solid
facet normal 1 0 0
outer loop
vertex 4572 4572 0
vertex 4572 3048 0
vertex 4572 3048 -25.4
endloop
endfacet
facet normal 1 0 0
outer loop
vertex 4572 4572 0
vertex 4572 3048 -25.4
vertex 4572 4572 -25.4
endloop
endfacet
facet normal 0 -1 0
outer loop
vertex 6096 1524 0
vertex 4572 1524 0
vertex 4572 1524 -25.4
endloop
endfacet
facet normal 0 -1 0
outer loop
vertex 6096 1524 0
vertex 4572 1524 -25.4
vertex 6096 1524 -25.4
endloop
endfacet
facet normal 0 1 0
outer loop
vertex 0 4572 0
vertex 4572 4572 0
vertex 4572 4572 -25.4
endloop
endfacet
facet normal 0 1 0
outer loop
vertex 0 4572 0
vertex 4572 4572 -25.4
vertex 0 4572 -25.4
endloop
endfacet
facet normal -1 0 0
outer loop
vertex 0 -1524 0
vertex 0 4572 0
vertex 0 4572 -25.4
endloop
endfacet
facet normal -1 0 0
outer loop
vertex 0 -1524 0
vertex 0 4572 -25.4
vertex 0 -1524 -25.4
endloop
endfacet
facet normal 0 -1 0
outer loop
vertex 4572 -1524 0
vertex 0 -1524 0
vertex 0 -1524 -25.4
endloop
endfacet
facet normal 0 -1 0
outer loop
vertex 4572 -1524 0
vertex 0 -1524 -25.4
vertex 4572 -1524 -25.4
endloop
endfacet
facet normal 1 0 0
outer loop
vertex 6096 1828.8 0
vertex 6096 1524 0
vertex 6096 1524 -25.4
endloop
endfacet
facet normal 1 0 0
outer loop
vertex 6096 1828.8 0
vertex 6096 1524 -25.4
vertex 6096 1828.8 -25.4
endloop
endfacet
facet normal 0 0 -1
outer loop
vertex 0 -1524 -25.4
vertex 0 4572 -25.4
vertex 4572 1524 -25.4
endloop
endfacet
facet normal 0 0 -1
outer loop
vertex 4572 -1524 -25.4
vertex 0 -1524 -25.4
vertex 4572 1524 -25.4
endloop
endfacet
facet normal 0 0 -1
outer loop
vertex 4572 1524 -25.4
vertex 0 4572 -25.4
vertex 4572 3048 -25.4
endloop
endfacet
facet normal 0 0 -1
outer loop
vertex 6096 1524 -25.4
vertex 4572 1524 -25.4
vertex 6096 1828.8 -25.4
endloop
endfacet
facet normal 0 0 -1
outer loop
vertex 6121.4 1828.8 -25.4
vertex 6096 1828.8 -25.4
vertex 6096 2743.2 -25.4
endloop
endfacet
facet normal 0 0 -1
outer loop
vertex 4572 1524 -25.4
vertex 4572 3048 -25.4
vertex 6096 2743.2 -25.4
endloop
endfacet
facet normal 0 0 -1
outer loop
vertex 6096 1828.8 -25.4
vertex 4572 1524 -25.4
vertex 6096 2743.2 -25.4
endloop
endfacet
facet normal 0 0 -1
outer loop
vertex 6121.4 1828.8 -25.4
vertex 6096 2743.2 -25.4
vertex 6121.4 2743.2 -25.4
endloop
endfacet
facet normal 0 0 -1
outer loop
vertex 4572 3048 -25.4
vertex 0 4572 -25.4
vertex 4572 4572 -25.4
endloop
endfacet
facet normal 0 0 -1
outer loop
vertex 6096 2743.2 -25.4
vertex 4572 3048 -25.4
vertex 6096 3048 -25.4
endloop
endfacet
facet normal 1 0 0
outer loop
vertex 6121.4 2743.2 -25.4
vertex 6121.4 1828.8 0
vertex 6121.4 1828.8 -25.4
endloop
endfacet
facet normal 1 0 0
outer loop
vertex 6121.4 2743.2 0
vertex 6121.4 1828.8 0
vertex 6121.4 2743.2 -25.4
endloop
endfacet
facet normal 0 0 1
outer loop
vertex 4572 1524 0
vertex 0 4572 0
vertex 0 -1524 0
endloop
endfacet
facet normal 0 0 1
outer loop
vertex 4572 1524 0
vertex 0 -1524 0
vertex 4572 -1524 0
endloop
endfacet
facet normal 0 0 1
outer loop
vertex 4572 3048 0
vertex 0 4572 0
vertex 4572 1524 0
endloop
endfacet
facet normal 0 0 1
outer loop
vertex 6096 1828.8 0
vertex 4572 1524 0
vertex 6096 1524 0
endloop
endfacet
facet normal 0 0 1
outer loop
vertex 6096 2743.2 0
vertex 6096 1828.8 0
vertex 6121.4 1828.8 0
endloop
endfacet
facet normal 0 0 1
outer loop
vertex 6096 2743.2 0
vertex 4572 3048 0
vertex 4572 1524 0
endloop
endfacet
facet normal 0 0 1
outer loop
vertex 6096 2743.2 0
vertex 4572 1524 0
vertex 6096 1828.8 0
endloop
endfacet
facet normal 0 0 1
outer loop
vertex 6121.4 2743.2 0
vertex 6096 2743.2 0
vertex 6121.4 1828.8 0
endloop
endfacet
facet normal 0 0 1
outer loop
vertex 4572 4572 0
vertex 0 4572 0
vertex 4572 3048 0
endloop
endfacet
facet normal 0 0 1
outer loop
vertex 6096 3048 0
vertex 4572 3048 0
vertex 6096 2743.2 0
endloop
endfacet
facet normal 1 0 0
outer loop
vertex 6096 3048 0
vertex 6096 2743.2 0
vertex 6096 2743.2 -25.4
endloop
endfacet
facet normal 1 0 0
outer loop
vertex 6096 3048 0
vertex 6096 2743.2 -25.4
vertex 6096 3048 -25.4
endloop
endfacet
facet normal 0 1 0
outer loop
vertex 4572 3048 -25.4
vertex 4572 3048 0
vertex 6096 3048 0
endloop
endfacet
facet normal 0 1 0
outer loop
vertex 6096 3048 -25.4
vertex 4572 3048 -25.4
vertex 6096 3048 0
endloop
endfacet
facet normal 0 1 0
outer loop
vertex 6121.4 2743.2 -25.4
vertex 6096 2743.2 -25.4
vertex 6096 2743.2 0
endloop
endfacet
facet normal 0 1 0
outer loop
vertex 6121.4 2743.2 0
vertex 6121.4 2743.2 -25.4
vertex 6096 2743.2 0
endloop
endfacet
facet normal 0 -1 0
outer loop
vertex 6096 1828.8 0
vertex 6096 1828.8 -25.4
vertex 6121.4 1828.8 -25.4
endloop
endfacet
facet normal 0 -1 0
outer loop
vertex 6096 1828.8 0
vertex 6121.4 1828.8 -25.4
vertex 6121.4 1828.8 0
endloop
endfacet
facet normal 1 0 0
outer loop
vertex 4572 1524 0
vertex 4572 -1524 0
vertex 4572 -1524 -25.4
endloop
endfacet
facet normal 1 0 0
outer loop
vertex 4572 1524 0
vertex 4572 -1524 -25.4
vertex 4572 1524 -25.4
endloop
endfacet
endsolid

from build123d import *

# Parameters (mm, degrees)
F0_W     = 1524
F0_H     = 1524
F1_DEPTH = 25.4
F2_W     = 914.4
F2_H     = 25.4
F3_DEPTH = 25.4


with BuildPart() as f1:
    # F0 (on Top) → F1 (new body)
    with BuildSketch(Plane.XY):
        with Locations((5334, 2286)):
            Rectangle(F0_W, F0_H)
        with Locations((762, -762)):
            Rectangle(F0_W, F0_H)
        with Locations((762, 3810)):
            Rectangle(F0_W, F0_H)
        with Locations((3810, -762)):
            Rectangle(F0_W, F0_H)
        with Locations((3810, 3810)):
            Rectangle(F0_W, F0_H)
        with Locations((762, 762)):
            Rectangle(F0_W, F0_H)
        with Locations((762, 2286)):
            Rectangle(F0_W, F0_H)
        with Locations((2286, -762)):
            Rectangle(F0_W, F0_H)
        with Locations((2286, 3810)):
            Rectangle(F0_W, F0_H)
        with Locations((3810, 762)):
            Rectangle(F0_W, F0_H)
        with Locations((2286, 762)):
            Rectangle(F0_W, F0_H)
        with Locations((2286, 2286)):
            Rectangle(F0_W, F0_H)
        with Locations((3810, 2286)):
            Rectangle(F0_W, F0_H)
    extrude(amount=-F1_DEPTH)

    # F2 (on face) → F3 (join)
    with BuildSketch(Plane.YZ.offset(6096)):
        with Locations((2286, -12.7)):
            Rectangle(F2_W, F2_H)
    extrude(amount=F3_DEPTH)


solid = f1.part
